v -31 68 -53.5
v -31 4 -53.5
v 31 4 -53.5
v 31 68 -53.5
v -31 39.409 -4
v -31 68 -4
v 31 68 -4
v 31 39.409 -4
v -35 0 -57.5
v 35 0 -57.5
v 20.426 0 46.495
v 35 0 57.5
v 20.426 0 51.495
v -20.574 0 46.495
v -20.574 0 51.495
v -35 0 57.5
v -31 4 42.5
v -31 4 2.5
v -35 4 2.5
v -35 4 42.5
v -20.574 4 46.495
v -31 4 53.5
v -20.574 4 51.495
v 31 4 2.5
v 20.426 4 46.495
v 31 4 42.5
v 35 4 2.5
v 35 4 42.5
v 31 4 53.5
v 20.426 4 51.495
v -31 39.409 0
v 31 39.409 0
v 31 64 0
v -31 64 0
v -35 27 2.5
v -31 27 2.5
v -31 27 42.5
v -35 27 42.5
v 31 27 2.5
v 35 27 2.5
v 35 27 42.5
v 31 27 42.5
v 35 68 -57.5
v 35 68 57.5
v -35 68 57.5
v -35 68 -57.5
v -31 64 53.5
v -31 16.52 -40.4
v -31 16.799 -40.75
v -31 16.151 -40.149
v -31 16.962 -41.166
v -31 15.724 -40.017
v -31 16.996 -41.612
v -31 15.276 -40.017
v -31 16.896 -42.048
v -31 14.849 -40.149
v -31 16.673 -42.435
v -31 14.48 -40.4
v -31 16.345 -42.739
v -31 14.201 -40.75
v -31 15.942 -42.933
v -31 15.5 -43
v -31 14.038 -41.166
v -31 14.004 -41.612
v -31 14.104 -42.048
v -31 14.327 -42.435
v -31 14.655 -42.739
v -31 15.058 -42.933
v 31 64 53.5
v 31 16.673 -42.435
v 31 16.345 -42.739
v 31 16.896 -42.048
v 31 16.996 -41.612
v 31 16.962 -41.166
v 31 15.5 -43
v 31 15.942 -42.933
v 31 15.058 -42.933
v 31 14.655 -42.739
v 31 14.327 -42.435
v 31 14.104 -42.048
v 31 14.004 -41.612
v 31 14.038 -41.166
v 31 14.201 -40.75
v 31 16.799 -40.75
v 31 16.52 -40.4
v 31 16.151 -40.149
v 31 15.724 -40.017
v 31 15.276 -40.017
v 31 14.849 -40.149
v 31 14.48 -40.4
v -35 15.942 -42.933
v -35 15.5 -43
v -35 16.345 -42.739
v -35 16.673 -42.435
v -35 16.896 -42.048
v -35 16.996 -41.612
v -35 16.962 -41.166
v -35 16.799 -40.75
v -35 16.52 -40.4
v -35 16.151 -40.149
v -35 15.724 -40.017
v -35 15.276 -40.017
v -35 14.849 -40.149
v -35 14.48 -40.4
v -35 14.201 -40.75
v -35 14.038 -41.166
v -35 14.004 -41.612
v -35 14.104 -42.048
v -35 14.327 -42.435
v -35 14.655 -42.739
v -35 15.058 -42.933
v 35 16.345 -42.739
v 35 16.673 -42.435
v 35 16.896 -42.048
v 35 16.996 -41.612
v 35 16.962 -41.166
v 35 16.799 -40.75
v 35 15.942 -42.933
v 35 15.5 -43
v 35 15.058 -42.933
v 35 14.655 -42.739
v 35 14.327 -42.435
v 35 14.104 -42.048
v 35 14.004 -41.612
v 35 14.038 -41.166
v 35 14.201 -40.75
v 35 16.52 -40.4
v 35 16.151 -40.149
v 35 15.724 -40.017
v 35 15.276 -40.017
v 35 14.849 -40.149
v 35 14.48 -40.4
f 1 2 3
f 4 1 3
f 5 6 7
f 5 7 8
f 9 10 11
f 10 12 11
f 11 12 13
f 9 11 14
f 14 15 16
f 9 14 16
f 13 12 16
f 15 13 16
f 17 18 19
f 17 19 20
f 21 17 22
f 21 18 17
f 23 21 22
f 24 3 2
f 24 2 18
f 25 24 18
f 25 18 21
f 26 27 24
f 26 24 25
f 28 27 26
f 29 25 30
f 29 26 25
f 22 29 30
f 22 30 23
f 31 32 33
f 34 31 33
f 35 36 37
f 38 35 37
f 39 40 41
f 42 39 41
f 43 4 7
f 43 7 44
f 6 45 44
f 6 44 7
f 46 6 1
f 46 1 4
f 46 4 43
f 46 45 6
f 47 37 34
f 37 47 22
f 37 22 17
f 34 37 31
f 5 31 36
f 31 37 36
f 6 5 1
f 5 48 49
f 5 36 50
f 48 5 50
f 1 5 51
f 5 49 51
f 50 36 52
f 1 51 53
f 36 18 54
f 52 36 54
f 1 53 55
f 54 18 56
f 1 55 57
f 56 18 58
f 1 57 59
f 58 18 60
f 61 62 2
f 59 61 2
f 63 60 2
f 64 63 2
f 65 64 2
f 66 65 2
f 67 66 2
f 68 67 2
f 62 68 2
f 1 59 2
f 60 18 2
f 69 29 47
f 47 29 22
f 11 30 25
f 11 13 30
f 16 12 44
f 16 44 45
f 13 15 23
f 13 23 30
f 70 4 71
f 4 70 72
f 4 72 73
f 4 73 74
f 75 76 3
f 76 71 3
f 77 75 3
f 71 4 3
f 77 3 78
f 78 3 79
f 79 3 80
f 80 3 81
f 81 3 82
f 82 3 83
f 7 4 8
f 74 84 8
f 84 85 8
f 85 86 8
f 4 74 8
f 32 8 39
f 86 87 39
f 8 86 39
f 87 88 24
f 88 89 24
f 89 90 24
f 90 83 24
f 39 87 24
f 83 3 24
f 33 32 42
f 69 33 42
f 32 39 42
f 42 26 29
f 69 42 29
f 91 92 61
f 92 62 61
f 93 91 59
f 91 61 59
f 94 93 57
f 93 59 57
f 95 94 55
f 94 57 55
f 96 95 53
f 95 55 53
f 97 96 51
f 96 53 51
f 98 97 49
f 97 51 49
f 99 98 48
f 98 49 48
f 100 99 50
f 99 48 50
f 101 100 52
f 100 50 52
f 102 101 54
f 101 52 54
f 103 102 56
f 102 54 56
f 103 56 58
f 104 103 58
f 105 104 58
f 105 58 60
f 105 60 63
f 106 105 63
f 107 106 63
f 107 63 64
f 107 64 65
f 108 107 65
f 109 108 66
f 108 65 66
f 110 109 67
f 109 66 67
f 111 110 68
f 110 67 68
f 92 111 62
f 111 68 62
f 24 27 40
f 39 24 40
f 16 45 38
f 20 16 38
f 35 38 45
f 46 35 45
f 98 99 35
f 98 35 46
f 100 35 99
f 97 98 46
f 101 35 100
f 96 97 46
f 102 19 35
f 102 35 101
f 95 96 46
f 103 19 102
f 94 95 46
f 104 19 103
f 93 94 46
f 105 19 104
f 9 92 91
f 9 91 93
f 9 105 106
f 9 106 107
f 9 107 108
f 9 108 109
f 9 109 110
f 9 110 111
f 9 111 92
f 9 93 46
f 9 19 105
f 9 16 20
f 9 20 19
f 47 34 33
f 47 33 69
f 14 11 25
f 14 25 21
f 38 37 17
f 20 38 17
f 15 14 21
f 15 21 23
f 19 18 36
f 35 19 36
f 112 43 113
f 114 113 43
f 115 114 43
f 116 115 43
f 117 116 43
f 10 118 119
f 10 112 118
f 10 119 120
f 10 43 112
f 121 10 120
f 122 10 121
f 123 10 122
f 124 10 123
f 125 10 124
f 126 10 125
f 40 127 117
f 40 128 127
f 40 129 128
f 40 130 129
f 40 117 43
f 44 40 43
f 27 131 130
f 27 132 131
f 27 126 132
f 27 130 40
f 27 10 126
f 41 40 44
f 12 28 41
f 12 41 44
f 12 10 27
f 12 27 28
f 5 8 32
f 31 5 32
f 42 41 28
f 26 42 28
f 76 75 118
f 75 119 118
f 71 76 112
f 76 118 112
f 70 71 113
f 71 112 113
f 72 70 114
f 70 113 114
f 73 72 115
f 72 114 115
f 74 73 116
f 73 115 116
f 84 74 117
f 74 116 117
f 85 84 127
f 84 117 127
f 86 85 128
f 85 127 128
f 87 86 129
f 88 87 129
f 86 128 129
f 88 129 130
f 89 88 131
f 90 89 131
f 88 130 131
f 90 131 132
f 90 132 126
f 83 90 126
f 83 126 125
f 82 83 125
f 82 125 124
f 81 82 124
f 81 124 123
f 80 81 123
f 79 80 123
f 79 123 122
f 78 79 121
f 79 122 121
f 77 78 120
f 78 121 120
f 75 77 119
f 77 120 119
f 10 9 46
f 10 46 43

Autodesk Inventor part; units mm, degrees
ref_plane "YZ Plane" through (0, 0, 0) normal (1, 0, 0) x (0, 1, 0)
ref_plane "XZ Plane" through (0, 0, 0) normal (0, 1, 0) x (-1, 0, 0)
ref_plane "XY Plane" through (0, 0, 0) normal (0, 0, 1) x (1, 0, 0)
sketch "Эскиз1" plane through (0, 0, 0) normal (0, 1, 0) x (-1, 0, 0)
  line L0 (-35, 57.5) -> (35, 57.5)
  line L1 (35, 57.5) -> (35, -57.5)
  line L2 (35, -57.5) -> (-35, -57.5)
  line L3 (-35, -57.5) -> (-35, 57.5)
  line L4 (-35, 57.5) -> (35, -57.5) construction
  line L5 (35, 57.5) -> (-35, -57.5) construction
  point P0 (0, 0)
  dimension "d0" = 115
  dimension "d1" = 70
extrude "Выдавливание1" add sketch "Эскиз1" along normal blind 4
sketch "Эскиз2" plane through (0, 4, 0) normal (0, 1, 0) x (1, 0, 0)
  line L0 (35, 57.5) -> (-35, 57.5) projected
  line L1 (35, -57.5) -> (-35, -57.5)
  line L2 (-35, -57.5) -> (-35, 57.5)
  line L3 (-35, 57.5) -> (35, 57.5)
  line L4 (35, 57.5) -> (35, -57.5)
  line L5 (35, -57.5) -> (-35, 57.5) construction
  line L6 (-35, -57.5) -> (35, 57.5) construction
  line L7 (31, -53.5) -> (-31, -53.5)
  line L8 (-31, -53.5) -> (-31, 53.5)
  line L9 (-31, 53.5) -> (31, 53.5)
  line L10 (31, 53.5) -> (31, -53.5)
  line L11 (31, -53.5) -> (-31, 53.5) construction
  line L12 (-31, -53.5) -> (31, 53.5) construction
  point P0 (0, 0)
  dimension "d4" = 4
  dimension "d5" = 4
extrude "Выдавливание2" add sketch "Эскиз2" along normal blind 64
sketch "Эскиз3" plane through (35, 0, 57.5) normal (1, 0, 0) x (0, 0, -1)
  line L0 (111, 4) -> (4, 4) projected
  line L1 (15, 4) -> (55, 4)
  line L2 (55, 4) -> (55, 27)
  line L3 (55, 27) -> (15, 27)
  line L4 (15, 27) -> (15, 4)
  point P0 (57.5, 0)
  point P1 (0, 0)
  dimension "d9" = 40
  dimension "d10" = 23
extrude "Выдавливание3" cut sketch "Эскиз3" against normal blind 75
sketch "Эскиз4" plane through (35, 0, 57.5) normal (1, 0, 0) x (0, 0, -1)
  line L0 (55, 27) -> (55, 4) projected
  circle A0 centre (99, 15.5) radius 1.5
  point P0 (57.5, 0)
  dimension "d14" = 3
extrude "Выдавливание4" cut sketch "Эскиз4" against normal blind 75
sketch "Эскиз5" plane through (-31, 4, -53.5) normal (1, 0, 0) x (0, 0, -1)
  line L0 (-107, 0) -> (-107, 64) projected
  line L1 (-107, 64) -> (-49.5, 64)
  line L2 (-49.5, 64) -> (-49.5, 35.4088)
  line L3 (-49.5, 35.4088) -> (-53.5, 35.4088)
  line L4 (-53.5, 35.4088) -> (-53.5, 60)
  line L5 (-53.5, 60) -> (-107, 60)
  line L6 (-107, 60) -> (-107, 64)
  point P0 (-53.5, -4)
  dimension "d17" = 4
  dimension "d18" = 4
extrude "Выдавливание5" add sketch "Эскиз5" along normal blind 62
sketch "Эскиз6" plane through (0, 0, 0) normal (0, -1, 0) x (1, 0, 0)
  line L0 (-20.5745, 51.4953) -> (20.4255, 51.4953)
  line L1 (20.4255, 51.4953) -> (20.4255, 46.4953)
  line L2 (20.4255, 46.4953) -> (-20.5745, 46.4953)
  line L3 (-20.5745, 46.4953) -> (-20.5745, 51.4953)
  line L4 (-20.5745, 51.4953) -> (20.4255, 46.4953) construction
  line L5 (20.4255, 51.4953) -> (-20.5745, 46.4953) construction
  point P0 (0, 0)
  point P1 (-0.0745, 48.9953)
  dimension "d21" = 5
  dimension "d22" = 41
extrude "Выдавливание6" cut sketch "Эскиз6" against normal blind 10
properties part number "самосвал кузов"
